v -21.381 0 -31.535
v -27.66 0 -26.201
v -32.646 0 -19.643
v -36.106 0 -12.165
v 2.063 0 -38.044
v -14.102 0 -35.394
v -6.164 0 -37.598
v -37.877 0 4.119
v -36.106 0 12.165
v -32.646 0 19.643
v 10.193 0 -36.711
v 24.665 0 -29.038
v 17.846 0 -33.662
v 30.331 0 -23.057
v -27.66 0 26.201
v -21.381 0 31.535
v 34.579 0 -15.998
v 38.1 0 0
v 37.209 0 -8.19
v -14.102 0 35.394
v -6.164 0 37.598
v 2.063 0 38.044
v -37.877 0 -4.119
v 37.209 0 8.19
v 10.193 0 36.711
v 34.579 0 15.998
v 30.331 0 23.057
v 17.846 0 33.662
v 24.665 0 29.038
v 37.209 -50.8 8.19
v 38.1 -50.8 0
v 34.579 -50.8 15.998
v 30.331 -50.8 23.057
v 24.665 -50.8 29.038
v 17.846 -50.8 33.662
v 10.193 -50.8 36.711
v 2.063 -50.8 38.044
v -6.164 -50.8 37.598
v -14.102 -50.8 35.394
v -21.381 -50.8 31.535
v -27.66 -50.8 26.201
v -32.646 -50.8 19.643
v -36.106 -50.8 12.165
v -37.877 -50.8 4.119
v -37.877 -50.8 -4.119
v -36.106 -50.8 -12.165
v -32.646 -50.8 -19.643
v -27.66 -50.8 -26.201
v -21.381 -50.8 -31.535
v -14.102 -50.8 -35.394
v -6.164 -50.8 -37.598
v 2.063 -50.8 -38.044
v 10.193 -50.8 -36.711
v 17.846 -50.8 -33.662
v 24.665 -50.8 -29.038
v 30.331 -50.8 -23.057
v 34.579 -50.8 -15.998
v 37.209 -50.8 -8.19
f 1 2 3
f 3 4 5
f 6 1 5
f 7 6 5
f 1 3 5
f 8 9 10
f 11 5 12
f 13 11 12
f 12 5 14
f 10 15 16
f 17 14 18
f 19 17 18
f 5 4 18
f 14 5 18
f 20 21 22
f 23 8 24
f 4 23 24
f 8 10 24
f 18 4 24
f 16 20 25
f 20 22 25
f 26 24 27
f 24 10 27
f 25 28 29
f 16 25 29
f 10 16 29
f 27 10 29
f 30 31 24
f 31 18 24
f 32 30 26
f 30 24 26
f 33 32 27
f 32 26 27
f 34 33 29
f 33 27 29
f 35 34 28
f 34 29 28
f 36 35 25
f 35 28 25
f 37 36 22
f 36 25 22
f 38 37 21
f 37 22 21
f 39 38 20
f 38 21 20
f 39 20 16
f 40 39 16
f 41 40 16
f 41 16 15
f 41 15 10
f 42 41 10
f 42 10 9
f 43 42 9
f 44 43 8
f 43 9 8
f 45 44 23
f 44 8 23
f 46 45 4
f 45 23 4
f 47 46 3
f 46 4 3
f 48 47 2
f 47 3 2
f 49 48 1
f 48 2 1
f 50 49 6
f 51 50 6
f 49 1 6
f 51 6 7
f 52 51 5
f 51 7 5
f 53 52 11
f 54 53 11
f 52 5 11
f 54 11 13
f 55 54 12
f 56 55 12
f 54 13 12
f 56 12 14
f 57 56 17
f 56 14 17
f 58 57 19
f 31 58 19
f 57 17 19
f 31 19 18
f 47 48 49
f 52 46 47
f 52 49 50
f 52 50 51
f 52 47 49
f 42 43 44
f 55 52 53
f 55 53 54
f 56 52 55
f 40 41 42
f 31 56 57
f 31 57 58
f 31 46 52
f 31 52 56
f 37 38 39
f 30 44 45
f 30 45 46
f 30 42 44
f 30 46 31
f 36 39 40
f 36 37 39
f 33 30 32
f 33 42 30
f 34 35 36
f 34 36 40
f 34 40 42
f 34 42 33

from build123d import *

# Parameters (mm, degrees)
F0_R     = 38.1
F1_DEPTH = 12.7
F2_DEPTH = 25.4
F3_DEPTH = 12.7


# Not quite as in the source:
# - the program builds the solid bodies; features that only make, move or delete a surface that nothing else refers to are left out


with BuildPart() as f1:
    # F0 (on Front) → F1 (new body)
    with BuildSketch(Plane.XZ):
        Circle(F0_R)
    extrude(amount=F1_DEPTH)

    # F2 (add): a face of the model
    f2_faces = [f1.faces().sort_by_distance(p)[0] for p in [
        (0, -12.7, 0),
    ]]
    extrude(f2_faces, amount=F2_DEPTH)

    # F3 (add): a face of the model
    f3_faces = [f1.faces().sort_by_distance(p)[0] for p in [
        (0, -38.1, 0),
    ]]
    extrude(f3_faces, amount=F3_DEPTH)


solid = f1.part
